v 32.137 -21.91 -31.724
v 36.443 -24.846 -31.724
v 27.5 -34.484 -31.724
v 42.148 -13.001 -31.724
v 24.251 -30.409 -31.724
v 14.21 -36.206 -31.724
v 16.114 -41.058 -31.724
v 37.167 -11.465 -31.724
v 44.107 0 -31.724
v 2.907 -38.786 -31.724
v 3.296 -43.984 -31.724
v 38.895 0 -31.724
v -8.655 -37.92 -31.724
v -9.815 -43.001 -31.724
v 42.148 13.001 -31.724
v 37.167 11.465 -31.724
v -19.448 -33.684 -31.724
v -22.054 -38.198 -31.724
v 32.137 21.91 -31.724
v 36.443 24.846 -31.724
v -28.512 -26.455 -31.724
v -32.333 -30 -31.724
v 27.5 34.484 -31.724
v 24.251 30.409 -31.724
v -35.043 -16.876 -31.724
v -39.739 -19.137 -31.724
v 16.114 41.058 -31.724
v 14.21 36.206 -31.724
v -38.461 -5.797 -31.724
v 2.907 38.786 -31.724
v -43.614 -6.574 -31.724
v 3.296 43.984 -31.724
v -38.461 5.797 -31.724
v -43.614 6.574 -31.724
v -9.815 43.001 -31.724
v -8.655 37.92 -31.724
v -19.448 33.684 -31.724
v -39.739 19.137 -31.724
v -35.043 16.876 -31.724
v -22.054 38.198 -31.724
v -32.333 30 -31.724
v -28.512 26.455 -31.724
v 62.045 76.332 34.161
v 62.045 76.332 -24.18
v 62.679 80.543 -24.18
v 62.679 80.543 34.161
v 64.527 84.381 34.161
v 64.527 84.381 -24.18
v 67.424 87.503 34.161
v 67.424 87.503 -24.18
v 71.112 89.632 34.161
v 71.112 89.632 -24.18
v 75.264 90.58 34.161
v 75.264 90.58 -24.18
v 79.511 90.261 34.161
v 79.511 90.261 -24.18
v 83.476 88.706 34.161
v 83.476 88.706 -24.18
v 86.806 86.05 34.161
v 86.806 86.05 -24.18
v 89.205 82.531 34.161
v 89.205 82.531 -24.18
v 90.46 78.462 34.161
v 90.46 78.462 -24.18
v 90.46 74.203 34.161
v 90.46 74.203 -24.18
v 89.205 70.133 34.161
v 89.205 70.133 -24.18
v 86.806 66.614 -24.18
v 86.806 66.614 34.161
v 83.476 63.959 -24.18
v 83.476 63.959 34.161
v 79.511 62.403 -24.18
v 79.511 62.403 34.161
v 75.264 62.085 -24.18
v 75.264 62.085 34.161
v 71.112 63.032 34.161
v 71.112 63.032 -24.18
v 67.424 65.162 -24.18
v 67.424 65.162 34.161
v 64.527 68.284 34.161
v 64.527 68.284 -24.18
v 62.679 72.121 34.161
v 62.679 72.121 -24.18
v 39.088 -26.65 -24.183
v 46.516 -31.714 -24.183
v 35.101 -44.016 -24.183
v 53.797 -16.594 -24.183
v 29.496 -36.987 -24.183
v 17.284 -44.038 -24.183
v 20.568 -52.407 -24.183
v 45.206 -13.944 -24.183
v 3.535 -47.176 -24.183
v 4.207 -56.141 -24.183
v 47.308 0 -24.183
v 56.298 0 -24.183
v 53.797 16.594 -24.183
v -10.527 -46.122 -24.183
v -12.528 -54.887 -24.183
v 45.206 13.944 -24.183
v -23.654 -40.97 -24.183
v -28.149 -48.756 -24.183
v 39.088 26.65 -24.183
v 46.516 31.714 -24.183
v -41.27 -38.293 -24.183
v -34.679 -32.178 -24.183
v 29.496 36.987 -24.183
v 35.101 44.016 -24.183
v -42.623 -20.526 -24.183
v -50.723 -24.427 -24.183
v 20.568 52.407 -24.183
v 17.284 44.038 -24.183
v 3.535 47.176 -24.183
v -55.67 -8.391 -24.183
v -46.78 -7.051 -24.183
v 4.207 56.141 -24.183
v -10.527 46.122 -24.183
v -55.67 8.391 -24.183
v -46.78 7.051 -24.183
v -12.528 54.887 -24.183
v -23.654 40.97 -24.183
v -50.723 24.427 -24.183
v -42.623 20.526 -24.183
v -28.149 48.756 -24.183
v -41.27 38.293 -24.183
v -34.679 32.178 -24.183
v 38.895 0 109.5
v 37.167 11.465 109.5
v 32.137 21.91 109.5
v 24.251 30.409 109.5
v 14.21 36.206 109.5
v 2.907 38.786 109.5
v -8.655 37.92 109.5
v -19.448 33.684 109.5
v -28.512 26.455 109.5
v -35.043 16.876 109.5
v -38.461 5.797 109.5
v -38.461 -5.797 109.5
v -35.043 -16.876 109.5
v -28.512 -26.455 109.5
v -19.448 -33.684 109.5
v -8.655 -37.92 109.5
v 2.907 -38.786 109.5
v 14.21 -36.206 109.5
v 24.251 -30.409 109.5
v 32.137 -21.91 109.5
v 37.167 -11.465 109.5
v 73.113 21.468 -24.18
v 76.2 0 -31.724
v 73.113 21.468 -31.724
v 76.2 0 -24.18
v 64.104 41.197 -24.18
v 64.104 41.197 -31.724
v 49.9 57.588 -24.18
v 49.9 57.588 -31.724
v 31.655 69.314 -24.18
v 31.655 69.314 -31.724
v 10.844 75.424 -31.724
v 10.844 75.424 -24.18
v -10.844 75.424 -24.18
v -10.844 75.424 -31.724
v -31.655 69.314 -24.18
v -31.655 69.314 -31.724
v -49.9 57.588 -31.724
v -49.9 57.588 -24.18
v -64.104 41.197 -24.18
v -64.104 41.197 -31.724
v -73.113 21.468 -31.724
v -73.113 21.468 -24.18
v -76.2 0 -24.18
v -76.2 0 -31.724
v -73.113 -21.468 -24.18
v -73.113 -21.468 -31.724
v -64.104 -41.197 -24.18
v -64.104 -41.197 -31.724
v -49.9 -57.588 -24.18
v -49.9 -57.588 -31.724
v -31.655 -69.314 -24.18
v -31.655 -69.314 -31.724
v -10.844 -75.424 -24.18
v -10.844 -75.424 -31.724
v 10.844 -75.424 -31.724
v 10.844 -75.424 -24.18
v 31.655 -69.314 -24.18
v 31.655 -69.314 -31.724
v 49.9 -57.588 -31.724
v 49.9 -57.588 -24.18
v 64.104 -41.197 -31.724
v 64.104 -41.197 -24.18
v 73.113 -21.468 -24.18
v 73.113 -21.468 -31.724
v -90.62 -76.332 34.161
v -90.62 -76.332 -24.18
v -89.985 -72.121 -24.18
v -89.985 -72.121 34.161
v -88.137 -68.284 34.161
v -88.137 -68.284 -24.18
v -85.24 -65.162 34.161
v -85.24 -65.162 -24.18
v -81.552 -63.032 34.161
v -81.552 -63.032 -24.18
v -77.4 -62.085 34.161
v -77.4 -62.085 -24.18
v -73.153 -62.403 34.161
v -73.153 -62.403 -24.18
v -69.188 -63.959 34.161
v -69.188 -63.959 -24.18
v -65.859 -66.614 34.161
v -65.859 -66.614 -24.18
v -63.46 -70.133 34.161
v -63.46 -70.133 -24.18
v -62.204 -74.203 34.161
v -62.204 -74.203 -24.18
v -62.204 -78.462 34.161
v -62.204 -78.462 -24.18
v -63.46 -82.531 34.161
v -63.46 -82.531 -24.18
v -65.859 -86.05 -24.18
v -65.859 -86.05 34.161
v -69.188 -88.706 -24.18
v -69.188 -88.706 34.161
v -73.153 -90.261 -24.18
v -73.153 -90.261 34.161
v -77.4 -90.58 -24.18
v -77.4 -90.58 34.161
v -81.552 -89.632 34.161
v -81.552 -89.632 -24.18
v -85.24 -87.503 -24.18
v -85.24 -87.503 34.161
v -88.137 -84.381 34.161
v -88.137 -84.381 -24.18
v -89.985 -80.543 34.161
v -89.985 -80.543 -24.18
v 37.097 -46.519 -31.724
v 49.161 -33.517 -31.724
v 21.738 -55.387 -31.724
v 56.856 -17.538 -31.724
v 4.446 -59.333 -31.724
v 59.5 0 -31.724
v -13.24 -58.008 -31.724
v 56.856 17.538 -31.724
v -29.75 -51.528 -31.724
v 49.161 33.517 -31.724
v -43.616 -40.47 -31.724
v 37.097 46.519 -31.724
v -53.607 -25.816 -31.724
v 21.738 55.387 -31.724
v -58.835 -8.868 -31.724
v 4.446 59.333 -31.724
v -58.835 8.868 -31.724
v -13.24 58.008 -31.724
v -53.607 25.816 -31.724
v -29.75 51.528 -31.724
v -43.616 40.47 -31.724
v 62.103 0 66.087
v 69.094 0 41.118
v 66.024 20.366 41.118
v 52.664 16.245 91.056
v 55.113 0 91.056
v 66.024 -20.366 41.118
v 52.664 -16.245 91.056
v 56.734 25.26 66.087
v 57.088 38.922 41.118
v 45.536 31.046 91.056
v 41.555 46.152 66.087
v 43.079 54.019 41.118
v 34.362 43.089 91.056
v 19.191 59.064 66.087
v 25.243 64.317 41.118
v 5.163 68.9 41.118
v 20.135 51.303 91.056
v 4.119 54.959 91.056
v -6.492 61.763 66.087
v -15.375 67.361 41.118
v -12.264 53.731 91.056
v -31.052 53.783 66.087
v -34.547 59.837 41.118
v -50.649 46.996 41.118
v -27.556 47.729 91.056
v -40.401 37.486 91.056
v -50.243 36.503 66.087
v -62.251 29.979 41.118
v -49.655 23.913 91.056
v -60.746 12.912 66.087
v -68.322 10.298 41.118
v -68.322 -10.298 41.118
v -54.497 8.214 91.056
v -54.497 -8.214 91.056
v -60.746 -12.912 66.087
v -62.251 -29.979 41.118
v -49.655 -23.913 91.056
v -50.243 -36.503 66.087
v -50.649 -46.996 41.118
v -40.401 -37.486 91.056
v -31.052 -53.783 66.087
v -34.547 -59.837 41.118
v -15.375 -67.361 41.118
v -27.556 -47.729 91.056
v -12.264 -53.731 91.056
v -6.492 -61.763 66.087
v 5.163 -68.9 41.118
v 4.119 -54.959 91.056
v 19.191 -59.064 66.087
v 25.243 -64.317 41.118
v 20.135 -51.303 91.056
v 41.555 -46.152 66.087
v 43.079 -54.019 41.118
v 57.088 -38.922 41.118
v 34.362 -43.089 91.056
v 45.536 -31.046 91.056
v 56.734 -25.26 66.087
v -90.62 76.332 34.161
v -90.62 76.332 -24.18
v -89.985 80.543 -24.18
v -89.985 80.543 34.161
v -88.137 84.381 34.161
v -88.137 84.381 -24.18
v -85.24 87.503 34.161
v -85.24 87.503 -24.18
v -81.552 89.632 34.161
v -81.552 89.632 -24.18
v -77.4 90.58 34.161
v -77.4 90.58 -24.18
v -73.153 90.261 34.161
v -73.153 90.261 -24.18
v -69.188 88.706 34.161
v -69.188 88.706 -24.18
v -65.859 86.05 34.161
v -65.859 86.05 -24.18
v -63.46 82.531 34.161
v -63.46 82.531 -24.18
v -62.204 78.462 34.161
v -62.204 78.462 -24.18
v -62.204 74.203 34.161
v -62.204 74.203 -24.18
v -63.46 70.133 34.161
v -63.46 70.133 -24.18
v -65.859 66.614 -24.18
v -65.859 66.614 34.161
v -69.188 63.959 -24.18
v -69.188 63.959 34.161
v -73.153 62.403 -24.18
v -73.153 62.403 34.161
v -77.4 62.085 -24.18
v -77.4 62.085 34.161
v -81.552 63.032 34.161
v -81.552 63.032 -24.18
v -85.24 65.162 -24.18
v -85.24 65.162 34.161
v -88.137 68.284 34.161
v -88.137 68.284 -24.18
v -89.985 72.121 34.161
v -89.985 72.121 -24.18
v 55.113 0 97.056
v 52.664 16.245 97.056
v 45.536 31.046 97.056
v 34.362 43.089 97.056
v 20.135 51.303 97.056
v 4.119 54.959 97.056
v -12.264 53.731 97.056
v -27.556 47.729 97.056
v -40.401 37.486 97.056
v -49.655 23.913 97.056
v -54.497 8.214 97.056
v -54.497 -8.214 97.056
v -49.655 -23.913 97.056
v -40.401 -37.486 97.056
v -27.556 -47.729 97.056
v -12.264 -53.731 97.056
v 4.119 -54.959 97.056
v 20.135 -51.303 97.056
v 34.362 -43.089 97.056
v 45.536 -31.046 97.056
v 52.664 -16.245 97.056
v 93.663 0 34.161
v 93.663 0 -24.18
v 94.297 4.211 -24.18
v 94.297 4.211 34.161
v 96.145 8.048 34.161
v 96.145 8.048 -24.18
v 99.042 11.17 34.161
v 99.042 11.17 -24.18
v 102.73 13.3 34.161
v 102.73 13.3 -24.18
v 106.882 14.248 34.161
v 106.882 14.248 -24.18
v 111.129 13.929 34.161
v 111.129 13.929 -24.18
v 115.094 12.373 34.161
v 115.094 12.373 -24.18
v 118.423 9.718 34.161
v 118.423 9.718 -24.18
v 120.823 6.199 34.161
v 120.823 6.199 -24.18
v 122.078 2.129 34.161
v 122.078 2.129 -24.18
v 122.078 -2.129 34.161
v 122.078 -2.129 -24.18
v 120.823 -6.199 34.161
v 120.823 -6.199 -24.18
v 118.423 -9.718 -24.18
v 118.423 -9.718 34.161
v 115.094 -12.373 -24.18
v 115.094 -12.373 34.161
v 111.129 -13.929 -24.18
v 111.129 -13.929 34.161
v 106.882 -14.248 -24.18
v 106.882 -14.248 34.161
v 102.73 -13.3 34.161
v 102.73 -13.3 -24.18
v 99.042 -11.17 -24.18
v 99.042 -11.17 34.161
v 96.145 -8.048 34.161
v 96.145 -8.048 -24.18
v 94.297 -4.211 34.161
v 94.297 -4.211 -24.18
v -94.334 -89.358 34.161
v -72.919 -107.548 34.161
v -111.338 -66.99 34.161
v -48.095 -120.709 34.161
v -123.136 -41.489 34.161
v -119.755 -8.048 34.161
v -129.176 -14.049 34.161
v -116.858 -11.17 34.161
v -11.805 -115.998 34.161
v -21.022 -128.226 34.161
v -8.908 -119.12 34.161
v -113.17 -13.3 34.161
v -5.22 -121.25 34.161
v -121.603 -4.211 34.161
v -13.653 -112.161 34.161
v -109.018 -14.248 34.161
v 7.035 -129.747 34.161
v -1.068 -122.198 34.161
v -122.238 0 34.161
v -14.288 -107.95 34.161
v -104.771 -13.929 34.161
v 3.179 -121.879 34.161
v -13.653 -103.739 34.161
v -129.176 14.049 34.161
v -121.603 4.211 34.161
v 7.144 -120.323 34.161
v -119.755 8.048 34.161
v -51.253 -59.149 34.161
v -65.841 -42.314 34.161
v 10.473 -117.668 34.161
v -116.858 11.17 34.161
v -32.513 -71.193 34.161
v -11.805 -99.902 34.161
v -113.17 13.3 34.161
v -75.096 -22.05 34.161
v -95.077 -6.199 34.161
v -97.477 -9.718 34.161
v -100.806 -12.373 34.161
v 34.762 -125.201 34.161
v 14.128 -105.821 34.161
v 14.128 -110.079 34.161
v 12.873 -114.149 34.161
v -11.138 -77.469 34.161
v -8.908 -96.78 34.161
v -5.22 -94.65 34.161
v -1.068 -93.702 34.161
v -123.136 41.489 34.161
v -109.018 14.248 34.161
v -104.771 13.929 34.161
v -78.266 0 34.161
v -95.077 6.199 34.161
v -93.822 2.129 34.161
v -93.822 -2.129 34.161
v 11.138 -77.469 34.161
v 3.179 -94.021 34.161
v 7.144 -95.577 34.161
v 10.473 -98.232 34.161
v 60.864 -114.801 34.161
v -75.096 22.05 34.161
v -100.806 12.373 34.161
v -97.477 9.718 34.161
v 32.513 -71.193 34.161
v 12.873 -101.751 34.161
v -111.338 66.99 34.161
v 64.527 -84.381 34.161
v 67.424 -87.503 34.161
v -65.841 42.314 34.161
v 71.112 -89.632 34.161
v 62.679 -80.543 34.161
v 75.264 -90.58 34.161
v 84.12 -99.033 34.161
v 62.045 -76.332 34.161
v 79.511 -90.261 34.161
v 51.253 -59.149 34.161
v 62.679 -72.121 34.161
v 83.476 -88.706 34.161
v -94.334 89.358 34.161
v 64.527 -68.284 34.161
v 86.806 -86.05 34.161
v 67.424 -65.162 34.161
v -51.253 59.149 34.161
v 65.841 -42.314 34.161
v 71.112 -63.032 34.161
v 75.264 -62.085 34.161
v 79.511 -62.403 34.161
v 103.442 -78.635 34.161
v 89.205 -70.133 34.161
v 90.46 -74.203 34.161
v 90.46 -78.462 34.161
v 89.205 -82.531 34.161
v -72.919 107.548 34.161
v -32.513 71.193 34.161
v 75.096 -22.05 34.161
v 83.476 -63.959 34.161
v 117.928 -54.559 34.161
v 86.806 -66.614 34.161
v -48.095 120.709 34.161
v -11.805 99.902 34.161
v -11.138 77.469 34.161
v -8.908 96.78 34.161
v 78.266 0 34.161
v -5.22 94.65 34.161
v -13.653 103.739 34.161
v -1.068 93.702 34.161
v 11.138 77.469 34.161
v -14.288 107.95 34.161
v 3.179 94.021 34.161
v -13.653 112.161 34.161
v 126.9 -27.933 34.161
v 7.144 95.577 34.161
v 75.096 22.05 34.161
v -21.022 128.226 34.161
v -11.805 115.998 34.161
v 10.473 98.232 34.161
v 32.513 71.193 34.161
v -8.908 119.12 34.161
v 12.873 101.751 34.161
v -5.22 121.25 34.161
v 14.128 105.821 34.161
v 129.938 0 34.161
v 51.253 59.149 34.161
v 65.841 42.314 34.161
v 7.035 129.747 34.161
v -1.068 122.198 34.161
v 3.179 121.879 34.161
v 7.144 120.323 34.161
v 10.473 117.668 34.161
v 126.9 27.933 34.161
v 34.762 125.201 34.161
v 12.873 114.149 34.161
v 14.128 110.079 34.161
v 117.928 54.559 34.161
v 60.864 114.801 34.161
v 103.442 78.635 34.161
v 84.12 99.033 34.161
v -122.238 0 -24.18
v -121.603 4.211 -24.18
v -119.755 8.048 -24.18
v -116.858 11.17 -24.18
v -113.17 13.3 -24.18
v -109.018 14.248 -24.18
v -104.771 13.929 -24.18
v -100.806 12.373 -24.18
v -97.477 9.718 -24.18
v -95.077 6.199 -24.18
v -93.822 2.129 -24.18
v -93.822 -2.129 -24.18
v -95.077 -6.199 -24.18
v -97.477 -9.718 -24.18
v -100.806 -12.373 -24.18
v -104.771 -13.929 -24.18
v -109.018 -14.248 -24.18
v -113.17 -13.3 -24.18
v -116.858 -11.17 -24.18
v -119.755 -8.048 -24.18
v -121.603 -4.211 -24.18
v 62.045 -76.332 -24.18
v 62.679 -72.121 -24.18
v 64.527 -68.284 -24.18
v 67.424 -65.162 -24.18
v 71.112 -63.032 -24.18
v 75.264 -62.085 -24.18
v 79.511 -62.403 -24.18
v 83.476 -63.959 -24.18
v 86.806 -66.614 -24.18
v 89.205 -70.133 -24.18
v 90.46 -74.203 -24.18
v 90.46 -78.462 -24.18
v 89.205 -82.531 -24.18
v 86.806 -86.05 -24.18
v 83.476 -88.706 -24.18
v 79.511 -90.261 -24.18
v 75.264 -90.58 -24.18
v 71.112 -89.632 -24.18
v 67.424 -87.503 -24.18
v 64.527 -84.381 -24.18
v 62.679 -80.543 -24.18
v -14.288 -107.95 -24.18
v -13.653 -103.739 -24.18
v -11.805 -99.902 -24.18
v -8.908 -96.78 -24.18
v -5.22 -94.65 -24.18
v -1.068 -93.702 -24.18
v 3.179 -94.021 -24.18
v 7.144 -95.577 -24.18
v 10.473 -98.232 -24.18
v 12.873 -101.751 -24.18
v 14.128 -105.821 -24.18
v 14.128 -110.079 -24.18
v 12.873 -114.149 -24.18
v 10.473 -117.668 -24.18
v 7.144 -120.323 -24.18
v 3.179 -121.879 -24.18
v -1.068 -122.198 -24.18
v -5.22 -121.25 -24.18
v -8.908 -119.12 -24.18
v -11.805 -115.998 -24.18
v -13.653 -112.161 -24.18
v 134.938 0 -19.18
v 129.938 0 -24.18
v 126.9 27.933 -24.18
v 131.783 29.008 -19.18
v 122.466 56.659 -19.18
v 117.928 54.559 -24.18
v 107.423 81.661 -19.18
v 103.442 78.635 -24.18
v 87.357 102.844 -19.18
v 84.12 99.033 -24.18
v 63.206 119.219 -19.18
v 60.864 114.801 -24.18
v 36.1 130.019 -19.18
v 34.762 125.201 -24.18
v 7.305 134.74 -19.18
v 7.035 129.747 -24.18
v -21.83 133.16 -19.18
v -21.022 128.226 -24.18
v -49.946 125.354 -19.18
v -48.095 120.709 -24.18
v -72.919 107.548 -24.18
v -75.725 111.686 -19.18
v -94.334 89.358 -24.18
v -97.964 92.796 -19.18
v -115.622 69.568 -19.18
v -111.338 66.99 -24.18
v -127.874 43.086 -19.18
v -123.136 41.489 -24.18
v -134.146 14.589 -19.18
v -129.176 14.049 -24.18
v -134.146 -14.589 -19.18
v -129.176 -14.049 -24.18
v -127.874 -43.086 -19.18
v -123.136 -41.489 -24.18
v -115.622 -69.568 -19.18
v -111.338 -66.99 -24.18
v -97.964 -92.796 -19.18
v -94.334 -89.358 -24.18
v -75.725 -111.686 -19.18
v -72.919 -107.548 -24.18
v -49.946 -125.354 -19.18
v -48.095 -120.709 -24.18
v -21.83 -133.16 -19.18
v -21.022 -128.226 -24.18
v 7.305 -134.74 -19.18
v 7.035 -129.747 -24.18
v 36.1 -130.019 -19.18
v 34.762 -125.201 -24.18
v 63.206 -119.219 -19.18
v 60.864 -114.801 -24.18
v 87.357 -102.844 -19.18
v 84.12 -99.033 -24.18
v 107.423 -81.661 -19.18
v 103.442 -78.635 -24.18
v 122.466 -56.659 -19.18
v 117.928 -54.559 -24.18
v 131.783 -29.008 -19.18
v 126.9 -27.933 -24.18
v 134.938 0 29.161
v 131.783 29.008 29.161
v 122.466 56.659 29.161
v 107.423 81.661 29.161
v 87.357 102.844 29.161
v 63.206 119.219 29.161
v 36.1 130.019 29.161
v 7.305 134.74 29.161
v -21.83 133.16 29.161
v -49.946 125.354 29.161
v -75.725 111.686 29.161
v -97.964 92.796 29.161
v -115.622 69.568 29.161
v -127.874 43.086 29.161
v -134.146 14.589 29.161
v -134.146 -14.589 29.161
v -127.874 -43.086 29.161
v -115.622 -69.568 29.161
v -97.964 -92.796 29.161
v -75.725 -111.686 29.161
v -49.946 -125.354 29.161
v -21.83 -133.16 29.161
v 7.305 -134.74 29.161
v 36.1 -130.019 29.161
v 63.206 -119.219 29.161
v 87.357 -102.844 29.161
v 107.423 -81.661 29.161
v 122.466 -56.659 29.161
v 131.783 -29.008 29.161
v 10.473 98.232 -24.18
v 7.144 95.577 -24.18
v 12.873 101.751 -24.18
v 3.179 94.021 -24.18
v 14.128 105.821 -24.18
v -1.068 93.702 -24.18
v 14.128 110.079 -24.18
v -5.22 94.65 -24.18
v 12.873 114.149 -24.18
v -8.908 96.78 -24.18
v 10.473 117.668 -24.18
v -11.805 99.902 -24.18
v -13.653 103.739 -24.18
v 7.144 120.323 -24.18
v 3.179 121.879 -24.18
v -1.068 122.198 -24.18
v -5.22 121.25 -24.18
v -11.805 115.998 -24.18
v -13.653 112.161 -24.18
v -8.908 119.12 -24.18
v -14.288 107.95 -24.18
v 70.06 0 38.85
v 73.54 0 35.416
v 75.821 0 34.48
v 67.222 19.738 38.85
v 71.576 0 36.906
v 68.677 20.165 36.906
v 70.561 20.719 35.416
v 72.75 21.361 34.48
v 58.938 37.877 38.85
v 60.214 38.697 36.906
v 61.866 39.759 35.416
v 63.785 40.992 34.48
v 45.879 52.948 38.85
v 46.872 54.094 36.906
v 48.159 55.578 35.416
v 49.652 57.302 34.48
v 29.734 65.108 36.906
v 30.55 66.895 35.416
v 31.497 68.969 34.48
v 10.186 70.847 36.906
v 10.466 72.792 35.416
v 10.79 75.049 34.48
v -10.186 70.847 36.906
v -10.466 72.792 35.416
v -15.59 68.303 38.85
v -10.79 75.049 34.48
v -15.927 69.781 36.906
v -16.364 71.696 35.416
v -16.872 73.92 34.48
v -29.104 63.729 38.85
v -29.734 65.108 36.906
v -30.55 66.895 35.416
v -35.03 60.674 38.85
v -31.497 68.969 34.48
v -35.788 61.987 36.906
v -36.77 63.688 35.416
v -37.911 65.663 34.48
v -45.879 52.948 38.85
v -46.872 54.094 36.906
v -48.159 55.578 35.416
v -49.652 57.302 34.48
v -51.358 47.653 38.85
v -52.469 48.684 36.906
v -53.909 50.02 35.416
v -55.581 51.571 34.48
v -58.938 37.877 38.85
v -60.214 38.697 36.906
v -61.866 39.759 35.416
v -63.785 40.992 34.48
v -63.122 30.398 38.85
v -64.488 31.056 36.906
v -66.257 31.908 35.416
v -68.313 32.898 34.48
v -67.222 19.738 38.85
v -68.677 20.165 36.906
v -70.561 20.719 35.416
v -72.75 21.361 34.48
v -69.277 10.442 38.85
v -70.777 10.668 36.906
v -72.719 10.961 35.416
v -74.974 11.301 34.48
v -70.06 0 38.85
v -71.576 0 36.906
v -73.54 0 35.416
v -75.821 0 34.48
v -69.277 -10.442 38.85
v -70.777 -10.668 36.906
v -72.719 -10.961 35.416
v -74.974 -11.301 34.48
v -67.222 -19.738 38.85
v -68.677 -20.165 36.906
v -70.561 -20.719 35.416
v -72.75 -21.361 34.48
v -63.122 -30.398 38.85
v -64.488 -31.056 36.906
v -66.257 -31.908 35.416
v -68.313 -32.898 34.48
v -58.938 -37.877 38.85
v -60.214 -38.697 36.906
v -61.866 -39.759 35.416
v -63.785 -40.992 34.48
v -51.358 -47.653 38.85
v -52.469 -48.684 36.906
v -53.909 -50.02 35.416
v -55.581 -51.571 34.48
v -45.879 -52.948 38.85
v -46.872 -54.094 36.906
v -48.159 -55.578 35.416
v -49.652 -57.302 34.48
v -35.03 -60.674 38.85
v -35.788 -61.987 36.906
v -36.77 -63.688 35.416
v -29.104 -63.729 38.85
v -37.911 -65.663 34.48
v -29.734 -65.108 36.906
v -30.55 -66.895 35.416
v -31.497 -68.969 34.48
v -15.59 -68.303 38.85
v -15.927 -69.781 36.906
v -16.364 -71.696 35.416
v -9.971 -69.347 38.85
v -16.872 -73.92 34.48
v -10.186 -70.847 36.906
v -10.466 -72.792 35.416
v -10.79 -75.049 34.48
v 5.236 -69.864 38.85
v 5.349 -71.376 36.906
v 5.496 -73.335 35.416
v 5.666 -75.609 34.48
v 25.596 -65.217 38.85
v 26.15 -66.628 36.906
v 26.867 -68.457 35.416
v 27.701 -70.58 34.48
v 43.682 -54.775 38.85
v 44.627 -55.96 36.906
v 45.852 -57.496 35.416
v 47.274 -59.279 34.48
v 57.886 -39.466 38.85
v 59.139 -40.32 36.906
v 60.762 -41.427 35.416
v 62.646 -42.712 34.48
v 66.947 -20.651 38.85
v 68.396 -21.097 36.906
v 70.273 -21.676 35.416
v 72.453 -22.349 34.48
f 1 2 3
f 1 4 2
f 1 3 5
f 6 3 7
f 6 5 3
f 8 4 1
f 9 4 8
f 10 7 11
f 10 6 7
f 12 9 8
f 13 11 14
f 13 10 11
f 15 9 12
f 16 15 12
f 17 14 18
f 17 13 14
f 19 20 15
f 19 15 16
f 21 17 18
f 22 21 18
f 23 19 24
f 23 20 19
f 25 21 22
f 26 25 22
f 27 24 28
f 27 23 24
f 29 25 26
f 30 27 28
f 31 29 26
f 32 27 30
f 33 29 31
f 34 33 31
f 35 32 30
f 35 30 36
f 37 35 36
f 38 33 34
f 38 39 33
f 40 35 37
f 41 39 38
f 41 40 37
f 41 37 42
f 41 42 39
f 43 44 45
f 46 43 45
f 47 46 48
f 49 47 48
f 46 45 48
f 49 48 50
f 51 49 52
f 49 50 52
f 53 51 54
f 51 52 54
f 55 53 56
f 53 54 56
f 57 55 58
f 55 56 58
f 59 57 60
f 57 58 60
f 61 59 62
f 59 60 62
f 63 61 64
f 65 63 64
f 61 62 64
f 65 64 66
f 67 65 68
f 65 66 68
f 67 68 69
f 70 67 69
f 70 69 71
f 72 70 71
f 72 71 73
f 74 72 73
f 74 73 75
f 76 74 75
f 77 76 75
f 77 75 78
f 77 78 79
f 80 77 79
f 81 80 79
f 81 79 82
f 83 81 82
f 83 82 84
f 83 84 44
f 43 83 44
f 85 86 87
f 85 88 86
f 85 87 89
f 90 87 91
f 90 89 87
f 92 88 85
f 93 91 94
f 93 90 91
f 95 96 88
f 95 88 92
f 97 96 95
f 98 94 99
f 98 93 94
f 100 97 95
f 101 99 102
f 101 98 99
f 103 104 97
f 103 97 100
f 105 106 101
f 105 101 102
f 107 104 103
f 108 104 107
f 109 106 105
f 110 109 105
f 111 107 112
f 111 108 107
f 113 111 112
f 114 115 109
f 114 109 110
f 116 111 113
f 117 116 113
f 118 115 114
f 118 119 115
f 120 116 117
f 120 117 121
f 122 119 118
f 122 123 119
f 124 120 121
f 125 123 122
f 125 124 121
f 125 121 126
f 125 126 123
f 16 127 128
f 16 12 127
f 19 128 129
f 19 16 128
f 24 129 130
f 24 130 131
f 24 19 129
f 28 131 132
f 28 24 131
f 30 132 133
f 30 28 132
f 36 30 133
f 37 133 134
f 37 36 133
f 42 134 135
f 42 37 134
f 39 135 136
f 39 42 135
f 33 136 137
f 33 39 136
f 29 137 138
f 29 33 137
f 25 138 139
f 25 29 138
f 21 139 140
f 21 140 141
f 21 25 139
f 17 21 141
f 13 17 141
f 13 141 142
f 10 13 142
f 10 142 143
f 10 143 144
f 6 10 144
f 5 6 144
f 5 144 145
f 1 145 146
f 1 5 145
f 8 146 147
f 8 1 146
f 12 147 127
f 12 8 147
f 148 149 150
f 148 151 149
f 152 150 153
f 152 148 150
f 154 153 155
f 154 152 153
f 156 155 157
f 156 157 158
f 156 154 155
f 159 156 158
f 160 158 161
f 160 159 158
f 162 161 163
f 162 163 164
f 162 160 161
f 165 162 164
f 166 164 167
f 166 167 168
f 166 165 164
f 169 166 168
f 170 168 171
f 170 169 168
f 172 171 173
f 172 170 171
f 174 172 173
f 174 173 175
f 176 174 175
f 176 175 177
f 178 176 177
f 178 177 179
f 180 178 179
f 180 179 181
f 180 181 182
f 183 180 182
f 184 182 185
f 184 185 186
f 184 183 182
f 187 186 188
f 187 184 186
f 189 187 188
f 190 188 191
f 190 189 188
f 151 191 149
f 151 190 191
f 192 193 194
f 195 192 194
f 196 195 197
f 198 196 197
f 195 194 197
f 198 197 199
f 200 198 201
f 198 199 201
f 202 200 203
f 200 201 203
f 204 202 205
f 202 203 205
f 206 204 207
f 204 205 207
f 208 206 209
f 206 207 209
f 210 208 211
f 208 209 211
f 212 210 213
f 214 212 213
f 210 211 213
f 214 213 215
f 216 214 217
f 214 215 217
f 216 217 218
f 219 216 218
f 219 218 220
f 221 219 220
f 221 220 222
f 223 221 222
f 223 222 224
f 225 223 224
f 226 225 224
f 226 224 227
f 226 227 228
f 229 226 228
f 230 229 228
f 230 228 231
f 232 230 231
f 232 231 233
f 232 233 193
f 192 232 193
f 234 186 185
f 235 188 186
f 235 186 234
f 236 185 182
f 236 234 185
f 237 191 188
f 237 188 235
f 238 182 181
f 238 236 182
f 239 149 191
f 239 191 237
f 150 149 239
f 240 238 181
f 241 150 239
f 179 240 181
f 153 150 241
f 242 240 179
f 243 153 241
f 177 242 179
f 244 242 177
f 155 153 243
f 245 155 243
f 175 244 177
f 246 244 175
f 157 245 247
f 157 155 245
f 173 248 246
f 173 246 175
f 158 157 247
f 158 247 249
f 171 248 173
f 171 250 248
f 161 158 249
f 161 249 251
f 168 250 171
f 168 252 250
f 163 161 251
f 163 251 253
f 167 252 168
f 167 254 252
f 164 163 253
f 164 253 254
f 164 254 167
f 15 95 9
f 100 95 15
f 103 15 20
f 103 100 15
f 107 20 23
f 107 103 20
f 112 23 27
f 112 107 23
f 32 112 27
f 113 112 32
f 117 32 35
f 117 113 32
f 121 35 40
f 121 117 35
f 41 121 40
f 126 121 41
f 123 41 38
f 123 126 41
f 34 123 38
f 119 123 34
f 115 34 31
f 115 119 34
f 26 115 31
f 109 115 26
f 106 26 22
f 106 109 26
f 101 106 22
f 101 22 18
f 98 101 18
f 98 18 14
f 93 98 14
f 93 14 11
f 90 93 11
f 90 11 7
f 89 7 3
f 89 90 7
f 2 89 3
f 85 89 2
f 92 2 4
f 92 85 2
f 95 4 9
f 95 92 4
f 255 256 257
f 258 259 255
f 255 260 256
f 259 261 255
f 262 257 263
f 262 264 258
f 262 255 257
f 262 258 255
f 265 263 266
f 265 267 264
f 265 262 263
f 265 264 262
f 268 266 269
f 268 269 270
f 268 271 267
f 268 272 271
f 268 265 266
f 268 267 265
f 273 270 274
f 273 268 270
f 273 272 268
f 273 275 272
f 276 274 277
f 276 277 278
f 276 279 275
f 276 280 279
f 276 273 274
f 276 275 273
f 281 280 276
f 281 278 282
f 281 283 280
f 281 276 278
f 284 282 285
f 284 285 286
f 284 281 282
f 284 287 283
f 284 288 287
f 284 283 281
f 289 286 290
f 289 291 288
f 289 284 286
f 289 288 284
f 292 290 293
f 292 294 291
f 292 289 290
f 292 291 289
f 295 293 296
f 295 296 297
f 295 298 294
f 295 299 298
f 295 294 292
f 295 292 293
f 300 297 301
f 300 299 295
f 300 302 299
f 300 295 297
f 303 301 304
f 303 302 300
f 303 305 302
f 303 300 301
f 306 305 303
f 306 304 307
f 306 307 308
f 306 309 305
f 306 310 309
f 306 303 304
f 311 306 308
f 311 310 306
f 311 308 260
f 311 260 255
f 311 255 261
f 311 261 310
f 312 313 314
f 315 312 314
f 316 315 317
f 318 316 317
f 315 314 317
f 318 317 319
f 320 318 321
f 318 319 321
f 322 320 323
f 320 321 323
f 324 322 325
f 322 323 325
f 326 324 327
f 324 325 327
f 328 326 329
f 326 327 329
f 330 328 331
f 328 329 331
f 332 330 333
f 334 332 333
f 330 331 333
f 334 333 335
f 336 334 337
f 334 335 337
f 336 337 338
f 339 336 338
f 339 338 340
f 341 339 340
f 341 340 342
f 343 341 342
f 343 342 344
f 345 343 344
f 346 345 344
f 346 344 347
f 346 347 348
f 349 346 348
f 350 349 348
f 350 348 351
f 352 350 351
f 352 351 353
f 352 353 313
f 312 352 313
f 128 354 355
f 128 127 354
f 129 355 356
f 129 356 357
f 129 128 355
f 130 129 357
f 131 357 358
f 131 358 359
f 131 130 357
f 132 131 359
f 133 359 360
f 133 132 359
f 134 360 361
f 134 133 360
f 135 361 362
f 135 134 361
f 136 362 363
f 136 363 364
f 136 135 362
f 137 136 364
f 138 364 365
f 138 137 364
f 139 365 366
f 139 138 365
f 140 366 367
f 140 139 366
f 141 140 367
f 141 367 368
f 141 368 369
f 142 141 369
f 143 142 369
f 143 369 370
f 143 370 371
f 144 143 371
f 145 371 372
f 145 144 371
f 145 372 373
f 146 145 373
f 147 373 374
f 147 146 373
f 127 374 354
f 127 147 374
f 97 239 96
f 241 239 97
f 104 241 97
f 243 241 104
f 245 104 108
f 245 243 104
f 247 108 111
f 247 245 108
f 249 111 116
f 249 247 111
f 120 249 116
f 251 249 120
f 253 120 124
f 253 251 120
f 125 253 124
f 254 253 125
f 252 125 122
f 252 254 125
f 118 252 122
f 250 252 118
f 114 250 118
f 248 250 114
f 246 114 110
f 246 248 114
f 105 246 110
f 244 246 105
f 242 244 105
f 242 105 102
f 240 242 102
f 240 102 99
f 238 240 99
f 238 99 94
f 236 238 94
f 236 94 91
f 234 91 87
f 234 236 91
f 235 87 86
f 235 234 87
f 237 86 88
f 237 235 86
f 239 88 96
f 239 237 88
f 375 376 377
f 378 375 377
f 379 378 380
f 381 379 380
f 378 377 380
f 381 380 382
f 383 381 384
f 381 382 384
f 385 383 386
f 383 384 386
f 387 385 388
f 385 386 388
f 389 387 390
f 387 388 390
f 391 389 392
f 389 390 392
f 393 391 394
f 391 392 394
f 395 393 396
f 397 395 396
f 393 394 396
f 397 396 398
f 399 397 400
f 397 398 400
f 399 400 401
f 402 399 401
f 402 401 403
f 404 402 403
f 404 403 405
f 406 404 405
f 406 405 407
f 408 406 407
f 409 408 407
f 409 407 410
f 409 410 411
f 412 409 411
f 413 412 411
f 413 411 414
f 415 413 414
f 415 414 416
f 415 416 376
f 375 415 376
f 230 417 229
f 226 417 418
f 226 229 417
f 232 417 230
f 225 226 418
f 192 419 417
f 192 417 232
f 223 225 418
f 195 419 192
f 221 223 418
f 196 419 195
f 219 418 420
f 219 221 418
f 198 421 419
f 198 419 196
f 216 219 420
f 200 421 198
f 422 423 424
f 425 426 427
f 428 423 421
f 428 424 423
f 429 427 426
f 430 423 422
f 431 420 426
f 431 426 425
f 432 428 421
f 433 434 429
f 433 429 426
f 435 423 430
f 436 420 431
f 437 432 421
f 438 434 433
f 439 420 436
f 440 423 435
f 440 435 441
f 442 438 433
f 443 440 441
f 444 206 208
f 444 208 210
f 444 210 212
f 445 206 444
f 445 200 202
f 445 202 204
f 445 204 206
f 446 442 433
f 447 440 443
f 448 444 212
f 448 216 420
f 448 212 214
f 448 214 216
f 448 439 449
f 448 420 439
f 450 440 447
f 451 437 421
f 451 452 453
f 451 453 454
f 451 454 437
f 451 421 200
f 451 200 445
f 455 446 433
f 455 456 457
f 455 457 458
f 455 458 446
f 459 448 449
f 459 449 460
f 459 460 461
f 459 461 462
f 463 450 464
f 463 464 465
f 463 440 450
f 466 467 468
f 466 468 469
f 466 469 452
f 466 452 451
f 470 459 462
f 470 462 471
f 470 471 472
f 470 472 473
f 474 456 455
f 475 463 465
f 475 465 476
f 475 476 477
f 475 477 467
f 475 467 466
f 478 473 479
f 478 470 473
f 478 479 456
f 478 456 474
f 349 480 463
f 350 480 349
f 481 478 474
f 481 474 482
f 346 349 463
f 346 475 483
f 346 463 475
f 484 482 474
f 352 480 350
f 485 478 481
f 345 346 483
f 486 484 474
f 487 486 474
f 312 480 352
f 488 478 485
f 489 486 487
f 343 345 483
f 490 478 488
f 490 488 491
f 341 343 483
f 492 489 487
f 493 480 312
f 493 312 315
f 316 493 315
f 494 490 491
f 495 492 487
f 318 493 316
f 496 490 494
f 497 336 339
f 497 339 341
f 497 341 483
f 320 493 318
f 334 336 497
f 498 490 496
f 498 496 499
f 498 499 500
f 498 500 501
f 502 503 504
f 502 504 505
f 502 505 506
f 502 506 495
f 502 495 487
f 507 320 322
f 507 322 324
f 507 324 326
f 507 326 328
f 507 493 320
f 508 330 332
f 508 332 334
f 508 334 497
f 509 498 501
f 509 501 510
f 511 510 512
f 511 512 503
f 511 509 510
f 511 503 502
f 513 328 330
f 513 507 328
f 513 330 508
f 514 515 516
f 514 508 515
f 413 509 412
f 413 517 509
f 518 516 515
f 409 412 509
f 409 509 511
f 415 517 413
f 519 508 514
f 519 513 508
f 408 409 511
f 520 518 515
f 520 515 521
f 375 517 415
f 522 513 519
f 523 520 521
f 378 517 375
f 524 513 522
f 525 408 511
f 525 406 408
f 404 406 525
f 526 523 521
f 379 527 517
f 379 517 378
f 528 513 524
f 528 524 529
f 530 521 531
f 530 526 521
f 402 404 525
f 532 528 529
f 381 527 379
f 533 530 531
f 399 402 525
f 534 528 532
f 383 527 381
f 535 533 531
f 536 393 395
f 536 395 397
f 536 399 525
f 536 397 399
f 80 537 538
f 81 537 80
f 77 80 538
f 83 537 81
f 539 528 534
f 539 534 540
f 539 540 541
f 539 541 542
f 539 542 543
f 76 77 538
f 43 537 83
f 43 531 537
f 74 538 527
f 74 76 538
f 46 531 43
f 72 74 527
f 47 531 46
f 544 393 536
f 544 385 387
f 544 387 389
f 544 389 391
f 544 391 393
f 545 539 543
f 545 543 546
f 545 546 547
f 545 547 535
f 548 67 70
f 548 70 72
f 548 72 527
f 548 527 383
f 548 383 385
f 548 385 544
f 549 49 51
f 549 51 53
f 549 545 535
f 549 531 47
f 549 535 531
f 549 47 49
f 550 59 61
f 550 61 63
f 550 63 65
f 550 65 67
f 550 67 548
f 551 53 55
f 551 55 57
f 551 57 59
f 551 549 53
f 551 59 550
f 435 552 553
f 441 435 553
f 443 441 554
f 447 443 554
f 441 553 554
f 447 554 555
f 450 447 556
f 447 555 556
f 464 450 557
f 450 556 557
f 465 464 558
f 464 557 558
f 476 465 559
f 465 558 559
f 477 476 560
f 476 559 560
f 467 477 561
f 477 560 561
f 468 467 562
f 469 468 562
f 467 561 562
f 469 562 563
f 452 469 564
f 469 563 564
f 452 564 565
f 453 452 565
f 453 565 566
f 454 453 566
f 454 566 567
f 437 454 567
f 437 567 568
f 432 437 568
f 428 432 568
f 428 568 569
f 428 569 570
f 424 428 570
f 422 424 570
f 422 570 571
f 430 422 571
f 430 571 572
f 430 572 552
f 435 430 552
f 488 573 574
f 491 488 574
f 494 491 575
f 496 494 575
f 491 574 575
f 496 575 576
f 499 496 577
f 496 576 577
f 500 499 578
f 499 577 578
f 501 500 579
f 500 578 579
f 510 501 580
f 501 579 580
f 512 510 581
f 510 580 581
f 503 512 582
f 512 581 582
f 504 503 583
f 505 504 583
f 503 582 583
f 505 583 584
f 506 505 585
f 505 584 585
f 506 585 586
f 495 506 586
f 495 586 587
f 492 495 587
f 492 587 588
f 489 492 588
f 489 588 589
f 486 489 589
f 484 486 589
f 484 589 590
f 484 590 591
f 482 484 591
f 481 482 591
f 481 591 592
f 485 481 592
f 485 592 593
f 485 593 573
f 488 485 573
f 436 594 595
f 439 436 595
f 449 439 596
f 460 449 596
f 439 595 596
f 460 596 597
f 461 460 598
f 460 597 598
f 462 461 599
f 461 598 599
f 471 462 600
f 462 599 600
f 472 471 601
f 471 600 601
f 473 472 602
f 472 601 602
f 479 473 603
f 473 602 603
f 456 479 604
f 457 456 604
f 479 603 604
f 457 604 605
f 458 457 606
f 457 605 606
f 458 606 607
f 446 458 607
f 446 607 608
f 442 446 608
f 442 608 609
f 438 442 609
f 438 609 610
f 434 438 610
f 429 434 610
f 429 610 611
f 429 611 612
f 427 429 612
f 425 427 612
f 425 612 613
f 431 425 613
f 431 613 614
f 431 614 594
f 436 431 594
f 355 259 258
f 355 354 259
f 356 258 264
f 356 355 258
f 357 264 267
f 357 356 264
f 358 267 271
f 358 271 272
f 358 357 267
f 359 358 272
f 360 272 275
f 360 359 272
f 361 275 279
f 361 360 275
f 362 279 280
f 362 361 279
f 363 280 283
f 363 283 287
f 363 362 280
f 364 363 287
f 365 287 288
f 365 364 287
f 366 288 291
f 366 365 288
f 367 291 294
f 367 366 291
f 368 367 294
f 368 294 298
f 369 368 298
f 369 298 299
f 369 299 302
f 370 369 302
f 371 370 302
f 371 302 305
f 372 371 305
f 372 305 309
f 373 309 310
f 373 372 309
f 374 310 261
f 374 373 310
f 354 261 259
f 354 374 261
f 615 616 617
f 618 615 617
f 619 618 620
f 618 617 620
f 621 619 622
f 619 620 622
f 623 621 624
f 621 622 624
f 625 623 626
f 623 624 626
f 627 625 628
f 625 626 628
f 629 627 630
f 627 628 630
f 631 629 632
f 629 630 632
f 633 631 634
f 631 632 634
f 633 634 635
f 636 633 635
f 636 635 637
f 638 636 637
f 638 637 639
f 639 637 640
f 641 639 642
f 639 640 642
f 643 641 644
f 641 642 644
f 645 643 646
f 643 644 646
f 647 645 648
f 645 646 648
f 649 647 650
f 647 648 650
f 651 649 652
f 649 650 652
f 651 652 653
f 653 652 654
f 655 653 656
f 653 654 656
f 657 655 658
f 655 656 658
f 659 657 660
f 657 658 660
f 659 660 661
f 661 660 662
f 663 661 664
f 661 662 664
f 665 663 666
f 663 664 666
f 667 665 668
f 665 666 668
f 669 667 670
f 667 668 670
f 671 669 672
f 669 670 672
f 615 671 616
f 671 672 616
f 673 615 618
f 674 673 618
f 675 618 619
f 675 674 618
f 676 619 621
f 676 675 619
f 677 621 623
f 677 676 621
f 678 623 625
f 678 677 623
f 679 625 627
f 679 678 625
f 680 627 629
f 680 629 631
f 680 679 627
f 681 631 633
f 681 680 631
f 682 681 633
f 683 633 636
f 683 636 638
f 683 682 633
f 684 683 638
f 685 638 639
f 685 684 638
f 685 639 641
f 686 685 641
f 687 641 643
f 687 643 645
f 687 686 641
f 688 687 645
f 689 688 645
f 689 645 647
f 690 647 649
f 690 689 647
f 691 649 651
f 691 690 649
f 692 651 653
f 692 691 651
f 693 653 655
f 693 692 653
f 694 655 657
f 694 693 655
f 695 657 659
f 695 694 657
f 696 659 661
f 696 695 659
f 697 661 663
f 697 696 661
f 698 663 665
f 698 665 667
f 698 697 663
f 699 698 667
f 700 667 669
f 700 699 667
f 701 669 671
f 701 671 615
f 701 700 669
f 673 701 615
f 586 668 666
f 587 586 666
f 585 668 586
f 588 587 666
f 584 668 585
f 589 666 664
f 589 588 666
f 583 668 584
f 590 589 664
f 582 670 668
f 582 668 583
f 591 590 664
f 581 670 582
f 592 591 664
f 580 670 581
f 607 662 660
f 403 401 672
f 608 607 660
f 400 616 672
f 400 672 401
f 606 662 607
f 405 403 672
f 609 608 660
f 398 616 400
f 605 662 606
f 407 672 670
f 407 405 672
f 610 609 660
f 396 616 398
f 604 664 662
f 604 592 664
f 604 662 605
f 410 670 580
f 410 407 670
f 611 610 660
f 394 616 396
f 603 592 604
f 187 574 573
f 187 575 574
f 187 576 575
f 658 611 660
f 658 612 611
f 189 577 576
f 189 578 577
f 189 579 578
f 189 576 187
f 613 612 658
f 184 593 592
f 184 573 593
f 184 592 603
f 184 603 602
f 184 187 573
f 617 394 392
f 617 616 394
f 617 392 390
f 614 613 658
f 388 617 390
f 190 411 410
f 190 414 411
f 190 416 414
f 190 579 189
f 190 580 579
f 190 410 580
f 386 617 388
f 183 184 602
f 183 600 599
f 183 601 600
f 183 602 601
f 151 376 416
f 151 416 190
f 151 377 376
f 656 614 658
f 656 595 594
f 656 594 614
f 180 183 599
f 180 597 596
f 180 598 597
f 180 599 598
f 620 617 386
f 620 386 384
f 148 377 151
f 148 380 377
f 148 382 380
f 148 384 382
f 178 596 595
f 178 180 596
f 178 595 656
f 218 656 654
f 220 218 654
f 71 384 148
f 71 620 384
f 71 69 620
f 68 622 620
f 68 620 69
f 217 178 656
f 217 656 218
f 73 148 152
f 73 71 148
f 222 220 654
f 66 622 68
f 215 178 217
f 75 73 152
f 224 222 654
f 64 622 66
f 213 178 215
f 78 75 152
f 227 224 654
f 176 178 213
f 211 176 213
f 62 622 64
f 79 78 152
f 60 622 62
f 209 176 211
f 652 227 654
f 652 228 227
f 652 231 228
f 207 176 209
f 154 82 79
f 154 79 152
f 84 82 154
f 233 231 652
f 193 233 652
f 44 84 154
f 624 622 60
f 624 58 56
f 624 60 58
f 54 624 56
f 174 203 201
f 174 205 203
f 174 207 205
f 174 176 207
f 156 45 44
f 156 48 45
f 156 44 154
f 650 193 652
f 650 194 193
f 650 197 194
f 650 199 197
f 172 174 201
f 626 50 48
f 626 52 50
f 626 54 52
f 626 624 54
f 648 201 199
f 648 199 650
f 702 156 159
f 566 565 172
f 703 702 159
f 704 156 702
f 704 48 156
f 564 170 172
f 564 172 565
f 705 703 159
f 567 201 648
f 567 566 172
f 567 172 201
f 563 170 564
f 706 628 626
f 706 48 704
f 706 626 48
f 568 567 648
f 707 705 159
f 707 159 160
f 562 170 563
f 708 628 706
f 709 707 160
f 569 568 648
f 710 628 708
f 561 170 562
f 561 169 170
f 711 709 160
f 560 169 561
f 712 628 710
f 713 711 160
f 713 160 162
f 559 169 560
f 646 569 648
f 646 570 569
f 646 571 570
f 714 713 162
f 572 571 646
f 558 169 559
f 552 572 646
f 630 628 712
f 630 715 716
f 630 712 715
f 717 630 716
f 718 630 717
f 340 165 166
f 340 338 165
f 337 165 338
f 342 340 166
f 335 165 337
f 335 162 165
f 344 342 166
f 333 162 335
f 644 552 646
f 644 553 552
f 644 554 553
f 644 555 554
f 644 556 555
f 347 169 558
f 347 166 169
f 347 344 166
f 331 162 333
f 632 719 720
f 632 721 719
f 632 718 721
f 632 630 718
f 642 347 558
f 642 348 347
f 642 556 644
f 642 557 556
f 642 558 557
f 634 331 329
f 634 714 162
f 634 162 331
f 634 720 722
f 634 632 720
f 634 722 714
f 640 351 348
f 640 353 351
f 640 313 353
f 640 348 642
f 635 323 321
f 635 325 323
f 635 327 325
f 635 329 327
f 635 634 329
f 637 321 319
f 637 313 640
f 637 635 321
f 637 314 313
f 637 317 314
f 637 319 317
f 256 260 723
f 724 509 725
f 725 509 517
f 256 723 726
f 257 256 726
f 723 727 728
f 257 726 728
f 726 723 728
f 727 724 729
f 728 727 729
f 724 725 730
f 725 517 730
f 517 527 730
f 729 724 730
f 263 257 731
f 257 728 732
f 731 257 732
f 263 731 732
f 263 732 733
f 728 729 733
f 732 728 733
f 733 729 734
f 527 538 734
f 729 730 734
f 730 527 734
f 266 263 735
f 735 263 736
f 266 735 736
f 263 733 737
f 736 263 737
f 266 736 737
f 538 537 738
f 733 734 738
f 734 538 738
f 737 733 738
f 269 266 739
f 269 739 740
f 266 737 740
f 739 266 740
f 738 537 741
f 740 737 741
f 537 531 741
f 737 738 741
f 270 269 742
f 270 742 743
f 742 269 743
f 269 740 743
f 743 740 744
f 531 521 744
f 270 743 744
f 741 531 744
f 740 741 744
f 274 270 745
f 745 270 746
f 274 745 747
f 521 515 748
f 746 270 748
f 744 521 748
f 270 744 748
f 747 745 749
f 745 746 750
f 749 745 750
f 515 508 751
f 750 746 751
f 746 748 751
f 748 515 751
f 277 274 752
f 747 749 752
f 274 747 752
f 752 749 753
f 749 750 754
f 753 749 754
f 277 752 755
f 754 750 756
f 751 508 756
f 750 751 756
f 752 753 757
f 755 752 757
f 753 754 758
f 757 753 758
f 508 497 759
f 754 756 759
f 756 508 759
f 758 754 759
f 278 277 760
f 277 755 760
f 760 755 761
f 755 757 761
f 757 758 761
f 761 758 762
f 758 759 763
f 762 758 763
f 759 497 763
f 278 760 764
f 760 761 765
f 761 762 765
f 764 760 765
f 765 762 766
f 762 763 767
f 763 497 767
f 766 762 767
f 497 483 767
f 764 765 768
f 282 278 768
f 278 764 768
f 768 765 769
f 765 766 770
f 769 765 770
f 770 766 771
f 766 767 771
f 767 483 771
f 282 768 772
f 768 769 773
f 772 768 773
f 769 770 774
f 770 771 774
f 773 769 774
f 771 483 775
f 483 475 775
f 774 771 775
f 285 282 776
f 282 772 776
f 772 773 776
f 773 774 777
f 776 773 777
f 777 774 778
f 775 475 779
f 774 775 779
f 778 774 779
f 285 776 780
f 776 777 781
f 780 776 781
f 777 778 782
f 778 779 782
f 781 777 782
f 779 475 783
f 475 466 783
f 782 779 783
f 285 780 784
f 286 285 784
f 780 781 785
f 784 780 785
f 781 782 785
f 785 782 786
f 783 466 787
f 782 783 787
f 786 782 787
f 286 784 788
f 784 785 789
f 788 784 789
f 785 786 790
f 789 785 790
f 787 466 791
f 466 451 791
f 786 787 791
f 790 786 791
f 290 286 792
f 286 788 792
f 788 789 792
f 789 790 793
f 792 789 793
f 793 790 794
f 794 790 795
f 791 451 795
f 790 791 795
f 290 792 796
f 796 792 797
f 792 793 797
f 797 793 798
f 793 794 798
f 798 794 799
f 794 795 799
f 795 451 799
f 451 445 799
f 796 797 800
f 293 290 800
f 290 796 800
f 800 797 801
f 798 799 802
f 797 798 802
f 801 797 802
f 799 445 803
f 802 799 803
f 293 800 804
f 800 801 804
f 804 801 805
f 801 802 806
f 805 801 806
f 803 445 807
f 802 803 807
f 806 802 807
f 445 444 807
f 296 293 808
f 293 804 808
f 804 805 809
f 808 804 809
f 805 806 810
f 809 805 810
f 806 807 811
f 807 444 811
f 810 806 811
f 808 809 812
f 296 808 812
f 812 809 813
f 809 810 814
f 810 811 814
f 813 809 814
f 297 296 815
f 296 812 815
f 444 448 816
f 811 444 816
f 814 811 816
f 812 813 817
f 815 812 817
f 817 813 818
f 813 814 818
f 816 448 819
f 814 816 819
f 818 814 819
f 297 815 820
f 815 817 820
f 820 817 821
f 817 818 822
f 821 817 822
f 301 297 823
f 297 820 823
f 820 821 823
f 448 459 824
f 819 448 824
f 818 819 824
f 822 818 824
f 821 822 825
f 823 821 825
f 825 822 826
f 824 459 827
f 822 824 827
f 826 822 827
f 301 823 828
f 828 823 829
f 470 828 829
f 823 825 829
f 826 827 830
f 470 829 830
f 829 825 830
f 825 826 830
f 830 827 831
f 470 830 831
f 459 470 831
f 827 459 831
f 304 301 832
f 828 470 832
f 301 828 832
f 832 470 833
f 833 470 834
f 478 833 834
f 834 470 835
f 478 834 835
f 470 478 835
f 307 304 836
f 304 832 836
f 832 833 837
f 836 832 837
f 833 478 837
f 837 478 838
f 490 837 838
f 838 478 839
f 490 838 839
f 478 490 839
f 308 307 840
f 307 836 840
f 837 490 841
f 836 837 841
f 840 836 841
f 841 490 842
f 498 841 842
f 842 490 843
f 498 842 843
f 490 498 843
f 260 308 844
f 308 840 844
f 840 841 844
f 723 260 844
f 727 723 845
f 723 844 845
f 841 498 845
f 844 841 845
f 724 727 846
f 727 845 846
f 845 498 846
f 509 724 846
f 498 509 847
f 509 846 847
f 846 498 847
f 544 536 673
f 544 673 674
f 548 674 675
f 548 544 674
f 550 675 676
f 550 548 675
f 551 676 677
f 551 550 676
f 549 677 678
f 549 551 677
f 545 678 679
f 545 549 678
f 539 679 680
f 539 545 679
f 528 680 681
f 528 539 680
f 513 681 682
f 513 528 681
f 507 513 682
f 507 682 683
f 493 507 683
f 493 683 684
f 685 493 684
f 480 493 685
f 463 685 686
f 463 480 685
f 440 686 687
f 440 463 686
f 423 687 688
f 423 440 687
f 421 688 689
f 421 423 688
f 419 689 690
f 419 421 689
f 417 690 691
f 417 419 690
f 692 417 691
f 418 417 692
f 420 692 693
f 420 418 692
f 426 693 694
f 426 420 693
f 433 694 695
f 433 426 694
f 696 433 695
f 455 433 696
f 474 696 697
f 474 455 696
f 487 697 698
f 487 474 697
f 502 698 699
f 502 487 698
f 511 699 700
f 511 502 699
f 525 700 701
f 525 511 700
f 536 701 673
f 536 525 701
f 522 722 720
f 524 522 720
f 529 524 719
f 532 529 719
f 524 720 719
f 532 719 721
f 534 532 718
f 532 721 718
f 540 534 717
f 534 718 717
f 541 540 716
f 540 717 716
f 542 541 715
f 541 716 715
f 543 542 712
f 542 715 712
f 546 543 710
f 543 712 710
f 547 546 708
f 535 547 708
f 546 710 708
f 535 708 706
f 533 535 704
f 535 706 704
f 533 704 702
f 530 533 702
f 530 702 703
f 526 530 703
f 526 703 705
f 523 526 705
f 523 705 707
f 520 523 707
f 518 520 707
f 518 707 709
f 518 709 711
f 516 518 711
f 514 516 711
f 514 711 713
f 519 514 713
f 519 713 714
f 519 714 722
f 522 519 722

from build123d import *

# Parameters (mm, degrees)
F3_D    = 28.575
F4_R    = 9.525
F5_SIZE = 5
F6_SIZE = 5


with BuildPart() as f1:
    # F0 (on Front) → F1 (revolve)
    with BuildSketch(Plane.XZ):
        Polygon((38.89502, 109.5), (38.89502, -31.724), (44.1071, -31.724), (47.308175, -24.18274), (56.298425, -24.18274), (59.4995, -31.724), (76.2, -31.724), (76.2, -24.1802), (134.9375, -24.1802), (134.9375, 34.16106), (71.04126, 34.16106), (55.11292, 91.055568), (55.11292, 97.055568), align=None)
    revolve(axis=Axis((0, 0, 78.919753), (0, 0, 1)))

    # F3 (through all)
    with Locations(Plane.XY.offset(34.16106)):
        with Locations((0, 107.95), (76.332177, 76.332177), (107.95, 0), (76.332177, -76.332177), (0, -107.95), (-76.332177, -76.332177), (-107.95, 0), (-76.332177, 76.332177)):
            Hole(F3_D / 2)

    # F4
    f4_edges = [f1.edges().sort_by_distance(p)[0] for p in [
        (-71.04126, 0, 34.16106),
    ]]
    fillet(f4_edges, radius=F4_R)

    # F5
    f5_edges = [f1.edges().sort_by_distance(p)[0] for p in [
        (-134.9375, 0, -24.1802),
    ]]
    chamfer(f5_edges, length=F5_SIZE)

    # F6
    f6_edges = [f1.edges().sort_by_distance(p)[0] for p in [
        (-134.9375, 0, 34.16106),
    ]]
    chamfer(f6_edges, length=F6_SIZE)


solid = f1.part
